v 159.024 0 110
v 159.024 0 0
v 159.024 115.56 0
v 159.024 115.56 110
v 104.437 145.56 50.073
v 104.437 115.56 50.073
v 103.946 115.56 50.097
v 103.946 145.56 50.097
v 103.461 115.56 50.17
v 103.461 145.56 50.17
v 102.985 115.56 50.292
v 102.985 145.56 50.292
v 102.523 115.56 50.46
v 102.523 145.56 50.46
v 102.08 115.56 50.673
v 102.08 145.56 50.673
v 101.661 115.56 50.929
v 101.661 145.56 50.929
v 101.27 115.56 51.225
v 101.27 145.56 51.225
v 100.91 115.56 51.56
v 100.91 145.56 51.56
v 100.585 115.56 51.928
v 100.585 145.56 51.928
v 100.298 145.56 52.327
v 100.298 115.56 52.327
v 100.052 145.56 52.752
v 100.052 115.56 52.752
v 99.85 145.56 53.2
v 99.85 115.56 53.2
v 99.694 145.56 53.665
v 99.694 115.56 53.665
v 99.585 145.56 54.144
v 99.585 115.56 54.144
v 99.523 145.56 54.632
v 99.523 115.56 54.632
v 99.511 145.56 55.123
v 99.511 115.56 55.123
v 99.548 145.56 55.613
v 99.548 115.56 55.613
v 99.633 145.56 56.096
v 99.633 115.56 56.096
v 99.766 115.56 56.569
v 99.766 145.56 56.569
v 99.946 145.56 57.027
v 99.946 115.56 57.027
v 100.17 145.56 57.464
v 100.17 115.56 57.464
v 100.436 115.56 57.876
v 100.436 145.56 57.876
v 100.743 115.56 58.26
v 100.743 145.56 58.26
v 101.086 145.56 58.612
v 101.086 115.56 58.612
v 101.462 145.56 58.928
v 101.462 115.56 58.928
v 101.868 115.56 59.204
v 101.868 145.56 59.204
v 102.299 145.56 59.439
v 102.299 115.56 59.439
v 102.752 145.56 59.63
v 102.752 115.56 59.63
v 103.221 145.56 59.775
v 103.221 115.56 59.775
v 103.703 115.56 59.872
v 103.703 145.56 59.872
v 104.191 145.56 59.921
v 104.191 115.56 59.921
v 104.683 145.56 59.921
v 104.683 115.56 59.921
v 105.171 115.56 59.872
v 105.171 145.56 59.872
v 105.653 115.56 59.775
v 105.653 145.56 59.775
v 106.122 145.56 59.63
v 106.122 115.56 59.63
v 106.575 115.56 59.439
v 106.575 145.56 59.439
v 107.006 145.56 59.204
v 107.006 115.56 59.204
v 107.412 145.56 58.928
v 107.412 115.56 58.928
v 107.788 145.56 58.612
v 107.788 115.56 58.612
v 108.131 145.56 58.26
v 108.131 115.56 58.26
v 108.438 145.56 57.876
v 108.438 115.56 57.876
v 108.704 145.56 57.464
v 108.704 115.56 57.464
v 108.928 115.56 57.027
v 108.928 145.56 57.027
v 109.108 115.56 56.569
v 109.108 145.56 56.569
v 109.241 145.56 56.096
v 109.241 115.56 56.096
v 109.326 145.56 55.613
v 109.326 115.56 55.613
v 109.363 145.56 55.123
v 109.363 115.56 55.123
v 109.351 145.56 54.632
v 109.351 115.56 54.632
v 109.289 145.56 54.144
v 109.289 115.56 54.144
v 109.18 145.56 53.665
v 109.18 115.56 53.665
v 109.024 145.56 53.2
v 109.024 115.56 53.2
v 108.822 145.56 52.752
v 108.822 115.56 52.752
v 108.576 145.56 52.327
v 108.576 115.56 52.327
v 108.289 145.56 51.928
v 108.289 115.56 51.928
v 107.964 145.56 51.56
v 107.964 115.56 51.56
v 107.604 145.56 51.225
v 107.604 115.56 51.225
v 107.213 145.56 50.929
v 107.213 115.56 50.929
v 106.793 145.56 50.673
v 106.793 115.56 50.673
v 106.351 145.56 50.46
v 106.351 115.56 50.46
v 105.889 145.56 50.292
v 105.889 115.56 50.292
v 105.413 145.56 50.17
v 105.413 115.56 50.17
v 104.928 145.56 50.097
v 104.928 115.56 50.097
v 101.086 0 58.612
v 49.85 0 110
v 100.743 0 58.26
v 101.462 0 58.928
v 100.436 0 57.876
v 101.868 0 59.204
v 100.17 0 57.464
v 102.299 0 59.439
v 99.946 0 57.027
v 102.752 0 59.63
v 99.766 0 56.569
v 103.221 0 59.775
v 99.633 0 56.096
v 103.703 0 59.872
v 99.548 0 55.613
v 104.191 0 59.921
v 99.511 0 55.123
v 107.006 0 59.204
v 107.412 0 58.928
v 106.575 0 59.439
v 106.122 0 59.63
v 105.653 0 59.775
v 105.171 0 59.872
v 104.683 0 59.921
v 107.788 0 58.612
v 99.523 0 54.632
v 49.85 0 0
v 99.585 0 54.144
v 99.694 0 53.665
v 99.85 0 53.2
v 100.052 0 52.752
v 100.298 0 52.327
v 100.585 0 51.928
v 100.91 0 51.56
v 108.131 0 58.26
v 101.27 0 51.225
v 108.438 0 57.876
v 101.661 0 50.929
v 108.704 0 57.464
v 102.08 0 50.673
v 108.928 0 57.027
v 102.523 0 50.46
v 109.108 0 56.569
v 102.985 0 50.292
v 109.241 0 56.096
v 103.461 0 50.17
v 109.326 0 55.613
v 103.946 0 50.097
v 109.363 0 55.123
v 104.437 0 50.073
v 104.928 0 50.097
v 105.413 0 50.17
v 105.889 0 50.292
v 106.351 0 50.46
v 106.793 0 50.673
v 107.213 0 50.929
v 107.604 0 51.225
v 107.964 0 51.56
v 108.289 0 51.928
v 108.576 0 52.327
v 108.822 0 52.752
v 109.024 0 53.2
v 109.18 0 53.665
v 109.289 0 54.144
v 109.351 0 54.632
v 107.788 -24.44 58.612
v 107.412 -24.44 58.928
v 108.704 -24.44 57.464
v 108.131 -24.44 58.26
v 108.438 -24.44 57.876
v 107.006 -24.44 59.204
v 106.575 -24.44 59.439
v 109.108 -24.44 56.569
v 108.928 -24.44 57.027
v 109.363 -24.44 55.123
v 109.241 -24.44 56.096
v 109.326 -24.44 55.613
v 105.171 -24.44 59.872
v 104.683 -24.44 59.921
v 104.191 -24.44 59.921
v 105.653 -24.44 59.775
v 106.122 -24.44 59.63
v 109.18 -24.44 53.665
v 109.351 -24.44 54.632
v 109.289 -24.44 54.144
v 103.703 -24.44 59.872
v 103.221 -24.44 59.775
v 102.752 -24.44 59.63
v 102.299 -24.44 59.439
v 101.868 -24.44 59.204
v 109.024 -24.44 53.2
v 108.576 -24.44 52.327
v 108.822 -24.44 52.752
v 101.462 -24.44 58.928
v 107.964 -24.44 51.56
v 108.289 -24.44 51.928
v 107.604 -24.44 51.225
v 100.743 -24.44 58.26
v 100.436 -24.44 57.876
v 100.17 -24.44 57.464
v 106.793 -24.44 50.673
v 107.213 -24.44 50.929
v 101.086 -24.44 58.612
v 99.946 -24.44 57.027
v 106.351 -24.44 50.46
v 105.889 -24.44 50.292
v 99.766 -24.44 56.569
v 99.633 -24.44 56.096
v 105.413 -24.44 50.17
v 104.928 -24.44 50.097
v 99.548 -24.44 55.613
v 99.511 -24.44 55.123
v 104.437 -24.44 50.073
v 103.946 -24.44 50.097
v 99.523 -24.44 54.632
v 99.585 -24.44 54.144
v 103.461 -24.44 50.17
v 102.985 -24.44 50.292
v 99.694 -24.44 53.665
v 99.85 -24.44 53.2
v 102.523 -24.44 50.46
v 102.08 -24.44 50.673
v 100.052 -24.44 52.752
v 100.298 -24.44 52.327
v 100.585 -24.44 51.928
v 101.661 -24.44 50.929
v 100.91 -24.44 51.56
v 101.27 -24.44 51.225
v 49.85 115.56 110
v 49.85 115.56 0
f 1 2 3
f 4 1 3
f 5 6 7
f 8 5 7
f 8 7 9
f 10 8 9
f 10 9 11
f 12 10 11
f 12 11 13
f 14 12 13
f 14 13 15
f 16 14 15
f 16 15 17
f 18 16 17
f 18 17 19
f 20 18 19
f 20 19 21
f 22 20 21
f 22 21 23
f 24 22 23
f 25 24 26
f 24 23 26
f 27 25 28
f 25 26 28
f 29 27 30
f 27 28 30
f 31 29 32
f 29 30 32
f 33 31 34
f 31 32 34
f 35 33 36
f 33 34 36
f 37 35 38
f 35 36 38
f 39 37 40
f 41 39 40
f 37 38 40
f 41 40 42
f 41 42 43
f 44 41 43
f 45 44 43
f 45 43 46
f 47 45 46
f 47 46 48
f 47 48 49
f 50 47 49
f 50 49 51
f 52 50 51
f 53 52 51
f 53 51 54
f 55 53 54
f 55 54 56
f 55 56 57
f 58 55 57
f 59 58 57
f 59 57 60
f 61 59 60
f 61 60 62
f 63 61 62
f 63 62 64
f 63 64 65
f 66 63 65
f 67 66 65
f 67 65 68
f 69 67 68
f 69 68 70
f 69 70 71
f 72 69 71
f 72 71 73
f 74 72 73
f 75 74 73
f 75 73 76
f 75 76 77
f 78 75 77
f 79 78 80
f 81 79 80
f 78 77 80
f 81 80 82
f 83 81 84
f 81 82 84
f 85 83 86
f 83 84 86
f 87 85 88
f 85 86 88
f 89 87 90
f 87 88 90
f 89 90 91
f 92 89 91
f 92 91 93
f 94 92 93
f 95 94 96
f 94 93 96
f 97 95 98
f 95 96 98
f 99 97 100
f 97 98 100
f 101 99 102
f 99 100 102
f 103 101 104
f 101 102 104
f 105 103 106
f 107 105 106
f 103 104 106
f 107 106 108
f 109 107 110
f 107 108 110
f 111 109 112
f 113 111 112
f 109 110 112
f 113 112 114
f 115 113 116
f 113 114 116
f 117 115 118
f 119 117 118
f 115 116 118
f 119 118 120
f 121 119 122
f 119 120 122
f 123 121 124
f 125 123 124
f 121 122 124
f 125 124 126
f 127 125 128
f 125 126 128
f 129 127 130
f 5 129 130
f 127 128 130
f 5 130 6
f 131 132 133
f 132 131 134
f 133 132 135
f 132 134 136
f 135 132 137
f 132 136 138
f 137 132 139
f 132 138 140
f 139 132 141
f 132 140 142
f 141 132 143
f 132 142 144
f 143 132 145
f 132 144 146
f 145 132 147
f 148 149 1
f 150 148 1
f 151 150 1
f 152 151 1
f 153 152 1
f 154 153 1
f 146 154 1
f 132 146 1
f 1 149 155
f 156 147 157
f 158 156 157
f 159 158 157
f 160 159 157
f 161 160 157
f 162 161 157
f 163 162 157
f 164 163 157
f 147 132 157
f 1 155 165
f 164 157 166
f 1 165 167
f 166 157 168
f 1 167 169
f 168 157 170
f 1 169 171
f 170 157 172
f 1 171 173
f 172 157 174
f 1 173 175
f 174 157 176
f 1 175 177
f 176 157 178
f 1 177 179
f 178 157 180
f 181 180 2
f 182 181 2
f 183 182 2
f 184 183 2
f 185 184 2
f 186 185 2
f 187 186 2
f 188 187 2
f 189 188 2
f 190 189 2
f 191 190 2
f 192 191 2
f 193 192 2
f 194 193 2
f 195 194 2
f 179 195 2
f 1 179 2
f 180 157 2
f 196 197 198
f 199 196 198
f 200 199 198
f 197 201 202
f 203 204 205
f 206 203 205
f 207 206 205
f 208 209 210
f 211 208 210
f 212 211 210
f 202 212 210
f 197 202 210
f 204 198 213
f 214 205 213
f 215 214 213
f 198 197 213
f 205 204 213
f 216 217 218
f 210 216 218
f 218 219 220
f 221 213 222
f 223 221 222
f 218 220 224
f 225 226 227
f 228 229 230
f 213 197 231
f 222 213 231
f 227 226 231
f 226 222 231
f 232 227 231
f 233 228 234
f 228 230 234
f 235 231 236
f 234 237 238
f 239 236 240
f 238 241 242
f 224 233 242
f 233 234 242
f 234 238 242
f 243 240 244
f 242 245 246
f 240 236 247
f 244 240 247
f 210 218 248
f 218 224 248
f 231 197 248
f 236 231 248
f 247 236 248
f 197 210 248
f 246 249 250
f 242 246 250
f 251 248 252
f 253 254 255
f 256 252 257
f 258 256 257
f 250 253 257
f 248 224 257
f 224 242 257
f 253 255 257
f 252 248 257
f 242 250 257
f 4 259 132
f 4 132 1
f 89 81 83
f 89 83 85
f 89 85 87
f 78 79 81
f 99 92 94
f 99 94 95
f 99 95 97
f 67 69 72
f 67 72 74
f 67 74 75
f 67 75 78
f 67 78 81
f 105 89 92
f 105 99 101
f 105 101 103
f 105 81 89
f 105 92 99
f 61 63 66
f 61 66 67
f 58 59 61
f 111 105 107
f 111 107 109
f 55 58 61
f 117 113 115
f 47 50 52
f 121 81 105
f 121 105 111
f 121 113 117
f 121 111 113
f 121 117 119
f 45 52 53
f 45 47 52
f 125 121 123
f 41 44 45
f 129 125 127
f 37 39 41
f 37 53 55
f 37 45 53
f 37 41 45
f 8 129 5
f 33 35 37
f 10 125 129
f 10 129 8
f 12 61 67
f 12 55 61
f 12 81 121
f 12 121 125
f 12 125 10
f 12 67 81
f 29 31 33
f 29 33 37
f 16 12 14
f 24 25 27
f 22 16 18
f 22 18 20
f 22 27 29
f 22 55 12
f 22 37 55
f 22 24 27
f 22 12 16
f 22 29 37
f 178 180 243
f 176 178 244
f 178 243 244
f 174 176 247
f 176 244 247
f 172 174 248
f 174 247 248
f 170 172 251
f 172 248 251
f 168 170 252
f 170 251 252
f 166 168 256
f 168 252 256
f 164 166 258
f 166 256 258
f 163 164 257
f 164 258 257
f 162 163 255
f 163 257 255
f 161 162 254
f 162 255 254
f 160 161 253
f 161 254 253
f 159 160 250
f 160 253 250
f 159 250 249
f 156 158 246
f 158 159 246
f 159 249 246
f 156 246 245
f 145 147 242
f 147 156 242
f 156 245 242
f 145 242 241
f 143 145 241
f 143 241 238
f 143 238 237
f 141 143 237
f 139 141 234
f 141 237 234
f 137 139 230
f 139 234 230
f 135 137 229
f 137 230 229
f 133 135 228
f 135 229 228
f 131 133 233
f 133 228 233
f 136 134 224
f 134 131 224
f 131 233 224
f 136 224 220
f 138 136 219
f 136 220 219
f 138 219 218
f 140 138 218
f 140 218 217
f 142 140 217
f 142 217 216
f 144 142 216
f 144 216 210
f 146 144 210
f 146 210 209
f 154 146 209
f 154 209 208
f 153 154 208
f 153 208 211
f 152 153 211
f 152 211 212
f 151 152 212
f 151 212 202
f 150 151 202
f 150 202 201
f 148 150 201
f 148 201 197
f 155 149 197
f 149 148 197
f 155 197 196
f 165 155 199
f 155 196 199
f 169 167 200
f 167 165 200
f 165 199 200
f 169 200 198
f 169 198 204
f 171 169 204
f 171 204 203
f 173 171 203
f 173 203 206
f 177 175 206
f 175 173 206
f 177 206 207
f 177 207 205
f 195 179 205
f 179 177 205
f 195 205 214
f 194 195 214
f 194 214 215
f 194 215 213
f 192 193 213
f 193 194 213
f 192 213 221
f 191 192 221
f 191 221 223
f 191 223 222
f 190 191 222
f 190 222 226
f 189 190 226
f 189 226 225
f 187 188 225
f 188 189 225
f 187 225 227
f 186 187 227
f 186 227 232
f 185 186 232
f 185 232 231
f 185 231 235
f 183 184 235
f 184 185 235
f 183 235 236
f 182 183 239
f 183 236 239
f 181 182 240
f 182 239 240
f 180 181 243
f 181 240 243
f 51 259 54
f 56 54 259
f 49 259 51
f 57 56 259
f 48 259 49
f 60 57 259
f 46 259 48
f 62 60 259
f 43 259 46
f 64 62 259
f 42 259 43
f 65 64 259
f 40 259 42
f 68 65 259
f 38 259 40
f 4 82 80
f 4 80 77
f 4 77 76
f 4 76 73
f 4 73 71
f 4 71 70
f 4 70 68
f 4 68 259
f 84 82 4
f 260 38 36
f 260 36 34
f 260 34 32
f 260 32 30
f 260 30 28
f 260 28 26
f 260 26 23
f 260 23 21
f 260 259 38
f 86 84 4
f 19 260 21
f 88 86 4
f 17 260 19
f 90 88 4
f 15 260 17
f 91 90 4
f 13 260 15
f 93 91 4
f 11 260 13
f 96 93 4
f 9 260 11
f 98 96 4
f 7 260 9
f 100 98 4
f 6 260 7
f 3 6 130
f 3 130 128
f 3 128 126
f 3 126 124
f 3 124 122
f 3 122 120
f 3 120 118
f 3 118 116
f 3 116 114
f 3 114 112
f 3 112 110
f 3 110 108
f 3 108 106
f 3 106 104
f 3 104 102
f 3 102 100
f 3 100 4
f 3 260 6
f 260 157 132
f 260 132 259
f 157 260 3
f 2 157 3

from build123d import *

# Parameters (mm, degrees)
SKETCH_1_W           = 109.173065233
SKETCH_1_H           = 115.560150299
EXTRUDE_1_DEPTH      = 110
EXTRUDE_2_DEPTH      = 30
EXTRUDE_2_DEPTH_BACK = 140
SKETCH_2_R           = 4.92730672


with BuildPart() as part:
    # 草图1 → 凸台-拉伸1 (new body)
    with BuildSketch(Plane.XY):
        with Locations((104.436974975, 57.78007515)):
            Rectangle(SKETCH_1_W, SKETCH_1_H)
    extrude(amount=EXTRUDE_1_DEPTH)

    # 草图2 → 凸台-拉伸2 (add, two sides: drawn at the far end of the back side and taken through both)
    with BuildSketch(Plane(origin=(0, 115.560150299, 0), x_dir=(1, 0, 0), z_dir=(0, 1, 0)).offset(-EXTRUDE_2_DEPTH_BACK)):
        with Locations(Location((104.436974975, -55, 0), (0, 0, 90))):
            Circle(SKETCH_2_R)
    extrude(amount=EXTRUDE_2_DEPTH + EXTRUDE_2_DEPTH_BACK)


solid = part.part
